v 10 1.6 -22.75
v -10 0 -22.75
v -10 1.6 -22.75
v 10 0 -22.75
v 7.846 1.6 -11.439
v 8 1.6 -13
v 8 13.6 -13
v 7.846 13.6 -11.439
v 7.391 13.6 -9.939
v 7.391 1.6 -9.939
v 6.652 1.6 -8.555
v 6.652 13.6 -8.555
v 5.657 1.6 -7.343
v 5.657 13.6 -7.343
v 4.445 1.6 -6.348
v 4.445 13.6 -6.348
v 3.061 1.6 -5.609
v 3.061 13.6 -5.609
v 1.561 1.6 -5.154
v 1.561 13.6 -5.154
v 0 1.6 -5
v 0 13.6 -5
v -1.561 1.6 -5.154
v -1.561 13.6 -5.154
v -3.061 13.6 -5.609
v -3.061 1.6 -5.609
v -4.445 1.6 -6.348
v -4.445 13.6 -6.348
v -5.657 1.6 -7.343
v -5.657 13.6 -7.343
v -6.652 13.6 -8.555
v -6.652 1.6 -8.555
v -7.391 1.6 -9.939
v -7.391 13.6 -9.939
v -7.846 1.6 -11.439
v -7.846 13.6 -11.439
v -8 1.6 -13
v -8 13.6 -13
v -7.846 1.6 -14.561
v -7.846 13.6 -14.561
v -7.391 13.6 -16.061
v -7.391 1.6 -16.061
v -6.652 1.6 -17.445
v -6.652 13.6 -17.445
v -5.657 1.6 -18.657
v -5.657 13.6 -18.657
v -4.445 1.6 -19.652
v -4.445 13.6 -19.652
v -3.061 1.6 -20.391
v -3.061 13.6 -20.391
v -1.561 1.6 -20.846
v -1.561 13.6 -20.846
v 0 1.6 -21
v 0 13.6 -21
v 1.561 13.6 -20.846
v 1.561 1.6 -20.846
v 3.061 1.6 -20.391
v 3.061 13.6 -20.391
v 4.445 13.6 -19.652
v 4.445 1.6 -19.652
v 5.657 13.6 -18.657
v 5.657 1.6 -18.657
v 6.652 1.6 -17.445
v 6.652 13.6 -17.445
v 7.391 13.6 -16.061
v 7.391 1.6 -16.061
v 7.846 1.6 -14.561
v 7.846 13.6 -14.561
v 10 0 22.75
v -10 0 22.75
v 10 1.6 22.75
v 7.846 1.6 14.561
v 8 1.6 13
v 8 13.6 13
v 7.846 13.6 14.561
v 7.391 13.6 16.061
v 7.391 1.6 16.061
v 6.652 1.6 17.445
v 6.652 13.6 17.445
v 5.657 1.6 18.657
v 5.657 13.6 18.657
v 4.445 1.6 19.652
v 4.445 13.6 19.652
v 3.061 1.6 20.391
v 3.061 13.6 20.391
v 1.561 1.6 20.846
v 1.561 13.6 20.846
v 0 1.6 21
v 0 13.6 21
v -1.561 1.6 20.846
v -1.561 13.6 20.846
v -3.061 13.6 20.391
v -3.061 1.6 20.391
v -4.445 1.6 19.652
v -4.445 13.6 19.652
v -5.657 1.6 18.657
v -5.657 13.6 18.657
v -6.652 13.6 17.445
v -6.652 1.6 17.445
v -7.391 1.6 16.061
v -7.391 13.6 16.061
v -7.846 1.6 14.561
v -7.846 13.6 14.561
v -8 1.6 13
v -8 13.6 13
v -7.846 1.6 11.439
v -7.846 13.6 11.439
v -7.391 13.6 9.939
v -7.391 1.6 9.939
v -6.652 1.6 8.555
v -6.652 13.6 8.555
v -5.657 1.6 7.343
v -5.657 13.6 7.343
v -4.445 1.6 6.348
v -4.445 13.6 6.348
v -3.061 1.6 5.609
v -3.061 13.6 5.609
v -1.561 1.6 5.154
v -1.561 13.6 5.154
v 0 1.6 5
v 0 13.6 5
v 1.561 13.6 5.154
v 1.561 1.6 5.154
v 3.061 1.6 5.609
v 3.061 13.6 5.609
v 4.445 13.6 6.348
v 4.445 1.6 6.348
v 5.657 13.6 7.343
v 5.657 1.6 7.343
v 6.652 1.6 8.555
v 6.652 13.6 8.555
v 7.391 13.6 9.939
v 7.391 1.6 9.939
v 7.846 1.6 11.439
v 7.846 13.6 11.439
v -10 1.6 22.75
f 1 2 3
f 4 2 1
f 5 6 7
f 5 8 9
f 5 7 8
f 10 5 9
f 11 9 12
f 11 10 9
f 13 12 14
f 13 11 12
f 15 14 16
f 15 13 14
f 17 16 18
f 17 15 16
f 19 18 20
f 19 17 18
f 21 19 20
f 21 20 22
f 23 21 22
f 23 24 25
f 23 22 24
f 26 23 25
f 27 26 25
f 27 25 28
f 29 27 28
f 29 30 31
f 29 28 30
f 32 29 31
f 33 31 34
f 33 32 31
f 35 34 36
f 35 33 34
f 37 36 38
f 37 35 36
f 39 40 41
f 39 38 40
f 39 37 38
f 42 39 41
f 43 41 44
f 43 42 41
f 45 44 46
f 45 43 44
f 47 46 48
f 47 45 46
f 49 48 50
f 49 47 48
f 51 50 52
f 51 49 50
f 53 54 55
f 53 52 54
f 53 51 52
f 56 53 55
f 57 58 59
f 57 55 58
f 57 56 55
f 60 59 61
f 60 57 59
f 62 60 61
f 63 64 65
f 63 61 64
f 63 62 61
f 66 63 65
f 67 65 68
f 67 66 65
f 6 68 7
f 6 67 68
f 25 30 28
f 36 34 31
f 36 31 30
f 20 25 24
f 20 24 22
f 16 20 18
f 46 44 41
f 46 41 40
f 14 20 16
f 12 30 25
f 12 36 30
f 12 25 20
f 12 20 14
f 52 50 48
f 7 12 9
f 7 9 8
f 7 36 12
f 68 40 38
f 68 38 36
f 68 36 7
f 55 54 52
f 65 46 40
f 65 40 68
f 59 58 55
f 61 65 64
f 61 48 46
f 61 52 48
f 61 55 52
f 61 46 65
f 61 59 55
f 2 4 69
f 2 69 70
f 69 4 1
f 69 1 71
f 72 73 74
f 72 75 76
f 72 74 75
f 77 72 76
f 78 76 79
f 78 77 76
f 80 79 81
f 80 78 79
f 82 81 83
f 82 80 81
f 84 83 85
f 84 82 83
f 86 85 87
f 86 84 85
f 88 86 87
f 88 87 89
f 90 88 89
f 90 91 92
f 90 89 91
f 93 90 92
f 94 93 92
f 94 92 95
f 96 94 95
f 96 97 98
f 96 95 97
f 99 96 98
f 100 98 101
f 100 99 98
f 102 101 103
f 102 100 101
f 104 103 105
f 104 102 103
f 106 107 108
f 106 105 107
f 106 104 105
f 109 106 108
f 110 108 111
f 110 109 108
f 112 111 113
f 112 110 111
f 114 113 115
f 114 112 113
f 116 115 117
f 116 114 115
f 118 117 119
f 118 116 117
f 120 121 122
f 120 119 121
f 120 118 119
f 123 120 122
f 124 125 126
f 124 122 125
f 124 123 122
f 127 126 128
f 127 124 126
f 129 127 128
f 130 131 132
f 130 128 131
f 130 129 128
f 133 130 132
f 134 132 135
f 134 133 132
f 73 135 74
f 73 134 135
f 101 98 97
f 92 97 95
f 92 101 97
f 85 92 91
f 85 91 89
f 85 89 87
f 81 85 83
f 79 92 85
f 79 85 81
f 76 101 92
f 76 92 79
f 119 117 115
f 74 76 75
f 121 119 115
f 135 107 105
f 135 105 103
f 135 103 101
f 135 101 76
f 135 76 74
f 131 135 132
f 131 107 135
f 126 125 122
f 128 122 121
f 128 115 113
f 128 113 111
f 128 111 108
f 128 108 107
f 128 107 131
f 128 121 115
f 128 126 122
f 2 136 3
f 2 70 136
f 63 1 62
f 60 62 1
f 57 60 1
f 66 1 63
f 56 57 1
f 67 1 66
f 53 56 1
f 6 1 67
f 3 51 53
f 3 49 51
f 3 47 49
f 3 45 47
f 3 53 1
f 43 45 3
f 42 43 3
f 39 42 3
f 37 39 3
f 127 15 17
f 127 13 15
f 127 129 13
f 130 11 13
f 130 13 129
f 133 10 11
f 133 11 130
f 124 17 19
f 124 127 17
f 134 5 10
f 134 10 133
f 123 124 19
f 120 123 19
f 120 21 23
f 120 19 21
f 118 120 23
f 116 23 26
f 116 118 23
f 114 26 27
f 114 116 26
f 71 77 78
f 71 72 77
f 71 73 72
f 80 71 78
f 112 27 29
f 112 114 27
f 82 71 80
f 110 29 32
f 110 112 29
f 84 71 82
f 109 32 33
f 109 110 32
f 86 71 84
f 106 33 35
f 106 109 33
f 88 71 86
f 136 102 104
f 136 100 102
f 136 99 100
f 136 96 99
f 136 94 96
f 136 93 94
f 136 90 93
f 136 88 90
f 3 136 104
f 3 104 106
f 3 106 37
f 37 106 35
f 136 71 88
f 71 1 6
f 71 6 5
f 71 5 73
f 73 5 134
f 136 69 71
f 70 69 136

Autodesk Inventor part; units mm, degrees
ref_plane "YZ Plane" through (0, 0, 0) normal (1, 0, 0) x (0, 1, 0)
ref_plane "XZ Plane" through (0, 0, 0) normal (0, 1, 0) x (-1, 0, 0)
ref_plane "XY Plane" through (0, 0, 0) normal (0, 0, 1) x (1, 0, 0)
sketch "Sketch1" plane through (0, 0, 0) normal (0, 1, 0) x (-1, 0, 0)
  line L0 (-10, 22.75) -> (10, 22.75)
  line L1 (10, 22.75) -> (10, -22.75)
  line L2 (10, -22.75) -> (-10, -22.75)
  line L3 (-10, -22.75) -> (-10, 22.75)
  line L4 (-10, 22.75) -> (10, -22.75) construction
  line L5 (10, 22.75) -> (-10, -22.75) construction
  point P0 (0, 0)
  dimension "d0" = 20
  dimension "d1" = 45.5
extrude "Extrusion1" add sketch "Sketch1" along normal blind 1.6
sketch "Sketch2" plane through (0, 1.6, 0) normal (0, 1, 0) x (1, 0, 0)
  line L0 (0, 0) -> (0, 21) construction
  line L1 (0, 21) -> (0, 13) construction
  circle A0 centre (0, 13) radius 8
  line L2 (0, 0) -> (0, -13) construction
  circle A1 centre (0, -13) radius 8
  dimension "d4" = 21
  dimension "d5" = 8
  dimension "d6" = 16
  dimension "d7" = 13
  dimension "d8" = 16
extrude "Extrusion2" add sketch "Sketch2" along normal blind 12
properties part number "Sonar"
